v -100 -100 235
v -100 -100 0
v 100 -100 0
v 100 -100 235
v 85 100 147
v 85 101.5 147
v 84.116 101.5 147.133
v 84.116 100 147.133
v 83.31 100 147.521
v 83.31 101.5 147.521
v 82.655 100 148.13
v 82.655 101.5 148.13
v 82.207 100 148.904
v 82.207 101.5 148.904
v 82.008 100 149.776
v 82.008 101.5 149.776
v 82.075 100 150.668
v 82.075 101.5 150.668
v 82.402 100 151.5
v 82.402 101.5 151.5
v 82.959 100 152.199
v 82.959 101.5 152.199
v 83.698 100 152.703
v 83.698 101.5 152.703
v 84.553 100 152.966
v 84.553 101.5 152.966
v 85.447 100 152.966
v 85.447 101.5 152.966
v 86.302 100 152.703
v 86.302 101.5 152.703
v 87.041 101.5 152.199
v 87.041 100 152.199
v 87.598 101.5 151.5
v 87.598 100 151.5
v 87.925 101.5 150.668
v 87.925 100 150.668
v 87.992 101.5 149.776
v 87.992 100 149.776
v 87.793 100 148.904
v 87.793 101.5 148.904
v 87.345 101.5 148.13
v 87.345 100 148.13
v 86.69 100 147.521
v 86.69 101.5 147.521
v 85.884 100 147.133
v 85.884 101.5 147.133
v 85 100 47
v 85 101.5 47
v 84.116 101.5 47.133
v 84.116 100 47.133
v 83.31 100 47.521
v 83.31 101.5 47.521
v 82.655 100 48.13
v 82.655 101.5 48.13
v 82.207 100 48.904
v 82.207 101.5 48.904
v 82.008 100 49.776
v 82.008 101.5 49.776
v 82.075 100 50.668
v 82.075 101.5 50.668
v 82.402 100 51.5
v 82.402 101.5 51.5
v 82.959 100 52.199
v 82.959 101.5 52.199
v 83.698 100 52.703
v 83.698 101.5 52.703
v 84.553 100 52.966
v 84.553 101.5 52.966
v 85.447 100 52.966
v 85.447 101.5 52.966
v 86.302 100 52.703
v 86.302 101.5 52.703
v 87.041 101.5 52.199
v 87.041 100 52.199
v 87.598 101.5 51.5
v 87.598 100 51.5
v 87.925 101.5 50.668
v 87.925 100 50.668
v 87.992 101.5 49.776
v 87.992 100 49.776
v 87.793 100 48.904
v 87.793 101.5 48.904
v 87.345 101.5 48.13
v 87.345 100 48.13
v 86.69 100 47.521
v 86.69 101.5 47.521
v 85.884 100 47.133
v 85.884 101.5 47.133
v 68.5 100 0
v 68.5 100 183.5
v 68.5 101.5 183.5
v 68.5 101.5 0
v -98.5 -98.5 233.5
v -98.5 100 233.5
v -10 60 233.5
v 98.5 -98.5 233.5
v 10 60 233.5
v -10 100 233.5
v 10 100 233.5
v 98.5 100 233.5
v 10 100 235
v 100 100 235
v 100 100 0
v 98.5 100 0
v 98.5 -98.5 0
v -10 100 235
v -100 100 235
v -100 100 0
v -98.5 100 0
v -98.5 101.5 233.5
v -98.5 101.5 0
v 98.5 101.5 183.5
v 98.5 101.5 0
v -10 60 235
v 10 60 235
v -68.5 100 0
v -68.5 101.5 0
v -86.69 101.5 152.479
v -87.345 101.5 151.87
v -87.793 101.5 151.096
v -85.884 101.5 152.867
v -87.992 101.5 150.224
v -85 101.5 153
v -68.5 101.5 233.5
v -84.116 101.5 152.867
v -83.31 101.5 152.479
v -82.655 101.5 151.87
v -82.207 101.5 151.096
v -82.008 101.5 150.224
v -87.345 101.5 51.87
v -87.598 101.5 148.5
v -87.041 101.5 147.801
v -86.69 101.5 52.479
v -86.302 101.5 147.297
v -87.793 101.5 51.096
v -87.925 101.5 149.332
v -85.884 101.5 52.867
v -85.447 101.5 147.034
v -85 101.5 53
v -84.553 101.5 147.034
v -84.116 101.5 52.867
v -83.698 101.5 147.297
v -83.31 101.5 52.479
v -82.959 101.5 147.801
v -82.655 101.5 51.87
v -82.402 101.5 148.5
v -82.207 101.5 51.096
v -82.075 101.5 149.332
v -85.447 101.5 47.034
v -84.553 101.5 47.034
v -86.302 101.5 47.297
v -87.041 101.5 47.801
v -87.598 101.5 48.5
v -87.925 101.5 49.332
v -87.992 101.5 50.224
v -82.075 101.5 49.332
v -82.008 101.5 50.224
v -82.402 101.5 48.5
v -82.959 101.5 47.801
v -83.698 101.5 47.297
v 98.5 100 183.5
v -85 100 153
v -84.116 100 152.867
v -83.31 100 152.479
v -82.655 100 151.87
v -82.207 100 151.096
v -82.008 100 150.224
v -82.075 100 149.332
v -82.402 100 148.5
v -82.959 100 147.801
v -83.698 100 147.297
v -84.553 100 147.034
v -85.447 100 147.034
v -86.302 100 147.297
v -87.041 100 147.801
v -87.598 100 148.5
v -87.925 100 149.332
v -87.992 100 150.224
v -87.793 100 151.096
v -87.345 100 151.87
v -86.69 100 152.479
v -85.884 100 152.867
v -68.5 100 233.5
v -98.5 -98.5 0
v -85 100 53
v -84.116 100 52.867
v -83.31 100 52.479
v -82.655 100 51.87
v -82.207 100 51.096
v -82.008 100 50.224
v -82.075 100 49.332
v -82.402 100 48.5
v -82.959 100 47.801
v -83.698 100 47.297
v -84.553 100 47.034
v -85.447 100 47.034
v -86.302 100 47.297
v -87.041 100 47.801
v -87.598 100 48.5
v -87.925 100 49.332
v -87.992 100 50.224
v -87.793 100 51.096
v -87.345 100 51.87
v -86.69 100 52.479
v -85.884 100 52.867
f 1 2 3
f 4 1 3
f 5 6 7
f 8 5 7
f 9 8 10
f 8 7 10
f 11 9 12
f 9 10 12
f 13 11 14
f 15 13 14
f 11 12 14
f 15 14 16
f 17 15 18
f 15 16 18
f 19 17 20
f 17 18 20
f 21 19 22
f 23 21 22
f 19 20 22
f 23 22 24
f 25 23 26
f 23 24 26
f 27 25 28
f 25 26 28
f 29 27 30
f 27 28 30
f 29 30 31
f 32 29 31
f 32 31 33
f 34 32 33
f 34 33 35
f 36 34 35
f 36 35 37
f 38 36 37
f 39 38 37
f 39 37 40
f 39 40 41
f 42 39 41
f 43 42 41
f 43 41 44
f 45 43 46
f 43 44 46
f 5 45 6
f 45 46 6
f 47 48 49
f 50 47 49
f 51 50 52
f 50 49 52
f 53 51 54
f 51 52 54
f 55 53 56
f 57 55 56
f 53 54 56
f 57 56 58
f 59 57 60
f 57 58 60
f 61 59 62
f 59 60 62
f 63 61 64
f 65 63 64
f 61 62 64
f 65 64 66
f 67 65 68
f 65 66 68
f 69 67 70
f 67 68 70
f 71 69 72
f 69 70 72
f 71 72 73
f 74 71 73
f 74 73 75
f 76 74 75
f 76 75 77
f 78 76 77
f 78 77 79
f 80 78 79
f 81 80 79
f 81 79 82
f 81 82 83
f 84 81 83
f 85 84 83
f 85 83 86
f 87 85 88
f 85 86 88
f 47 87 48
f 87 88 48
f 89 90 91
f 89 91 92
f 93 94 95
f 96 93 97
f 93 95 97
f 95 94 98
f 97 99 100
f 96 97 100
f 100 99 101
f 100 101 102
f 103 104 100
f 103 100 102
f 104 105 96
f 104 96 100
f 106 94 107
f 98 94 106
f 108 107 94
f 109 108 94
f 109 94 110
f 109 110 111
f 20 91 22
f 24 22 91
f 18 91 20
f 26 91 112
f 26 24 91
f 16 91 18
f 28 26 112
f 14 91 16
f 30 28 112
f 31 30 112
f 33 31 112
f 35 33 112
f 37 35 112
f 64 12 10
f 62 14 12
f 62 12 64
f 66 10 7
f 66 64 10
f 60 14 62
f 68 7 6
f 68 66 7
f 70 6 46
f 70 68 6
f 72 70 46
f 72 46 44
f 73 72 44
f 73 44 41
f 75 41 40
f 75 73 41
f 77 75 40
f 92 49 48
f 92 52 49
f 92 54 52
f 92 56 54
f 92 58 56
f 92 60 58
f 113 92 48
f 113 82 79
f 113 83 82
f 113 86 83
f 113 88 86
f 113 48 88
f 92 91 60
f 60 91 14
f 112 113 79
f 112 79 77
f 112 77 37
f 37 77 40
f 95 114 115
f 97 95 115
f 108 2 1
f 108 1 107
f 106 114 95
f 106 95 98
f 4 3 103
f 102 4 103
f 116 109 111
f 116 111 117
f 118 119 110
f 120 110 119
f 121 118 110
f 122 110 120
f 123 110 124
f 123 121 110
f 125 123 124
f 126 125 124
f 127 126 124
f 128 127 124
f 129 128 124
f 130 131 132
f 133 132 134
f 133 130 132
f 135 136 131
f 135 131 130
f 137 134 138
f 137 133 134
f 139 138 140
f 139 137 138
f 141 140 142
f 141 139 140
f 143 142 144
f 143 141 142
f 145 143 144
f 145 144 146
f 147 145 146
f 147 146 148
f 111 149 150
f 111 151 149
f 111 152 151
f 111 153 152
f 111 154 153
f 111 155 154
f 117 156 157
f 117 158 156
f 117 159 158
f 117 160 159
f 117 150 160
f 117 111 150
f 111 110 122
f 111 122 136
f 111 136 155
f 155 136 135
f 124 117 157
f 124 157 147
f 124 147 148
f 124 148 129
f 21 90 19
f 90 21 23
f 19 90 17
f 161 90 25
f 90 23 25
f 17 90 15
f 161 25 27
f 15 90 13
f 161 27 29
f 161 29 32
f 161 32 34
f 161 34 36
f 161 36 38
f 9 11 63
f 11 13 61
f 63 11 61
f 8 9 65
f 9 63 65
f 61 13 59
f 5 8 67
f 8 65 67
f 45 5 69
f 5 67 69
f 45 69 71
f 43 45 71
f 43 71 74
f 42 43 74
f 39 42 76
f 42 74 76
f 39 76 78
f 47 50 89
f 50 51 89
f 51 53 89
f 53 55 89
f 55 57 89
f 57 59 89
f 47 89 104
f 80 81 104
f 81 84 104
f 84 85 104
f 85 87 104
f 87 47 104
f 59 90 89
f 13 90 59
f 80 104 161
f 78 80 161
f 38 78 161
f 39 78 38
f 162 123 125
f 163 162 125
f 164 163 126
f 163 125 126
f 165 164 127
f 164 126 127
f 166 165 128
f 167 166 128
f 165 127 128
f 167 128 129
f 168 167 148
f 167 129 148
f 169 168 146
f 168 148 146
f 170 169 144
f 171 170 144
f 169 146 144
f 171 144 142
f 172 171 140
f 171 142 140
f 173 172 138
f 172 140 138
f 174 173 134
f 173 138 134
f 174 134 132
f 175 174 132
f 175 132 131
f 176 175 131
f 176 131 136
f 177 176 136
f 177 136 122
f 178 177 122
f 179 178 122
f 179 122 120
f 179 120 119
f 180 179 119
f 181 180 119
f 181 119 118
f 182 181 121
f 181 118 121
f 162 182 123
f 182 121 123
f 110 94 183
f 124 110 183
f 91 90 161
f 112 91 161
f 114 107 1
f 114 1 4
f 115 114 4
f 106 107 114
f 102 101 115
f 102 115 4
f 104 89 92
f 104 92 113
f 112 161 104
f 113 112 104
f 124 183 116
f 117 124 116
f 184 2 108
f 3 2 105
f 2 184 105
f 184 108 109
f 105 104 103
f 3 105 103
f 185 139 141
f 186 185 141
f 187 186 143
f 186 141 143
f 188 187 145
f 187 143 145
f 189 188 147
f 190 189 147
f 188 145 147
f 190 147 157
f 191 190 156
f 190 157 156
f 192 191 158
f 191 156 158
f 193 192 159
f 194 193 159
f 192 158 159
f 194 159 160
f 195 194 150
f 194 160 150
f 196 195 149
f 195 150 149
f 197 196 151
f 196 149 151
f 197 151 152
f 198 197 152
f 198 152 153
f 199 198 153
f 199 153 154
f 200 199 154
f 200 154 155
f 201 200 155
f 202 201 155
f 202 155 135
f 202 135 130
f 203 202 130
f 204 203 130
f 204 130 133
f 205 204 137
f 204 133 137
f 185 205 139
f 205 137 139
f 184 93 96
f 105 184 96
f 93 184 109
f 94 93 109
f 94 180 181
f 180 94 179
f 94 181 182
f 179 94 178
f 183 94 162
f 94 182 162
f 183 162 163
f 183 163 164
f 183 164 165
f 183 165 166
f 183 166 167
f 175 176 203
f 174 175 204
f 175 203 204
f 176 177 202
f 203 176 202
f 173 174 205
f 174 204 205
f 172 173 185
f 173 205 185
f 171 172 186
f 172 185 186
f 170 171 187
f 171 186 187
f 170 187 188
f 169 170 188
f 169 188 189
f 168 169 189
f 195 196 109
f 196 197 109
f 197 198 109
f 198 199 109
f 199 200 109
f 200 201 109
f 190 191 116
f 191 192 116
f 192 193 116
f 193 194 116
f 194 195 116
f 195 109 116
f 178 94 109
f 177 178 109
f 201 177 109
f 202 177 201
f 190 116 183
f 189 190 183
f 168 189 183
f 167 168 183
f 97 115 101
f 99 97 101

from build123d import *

# Parameters (mm, degrees)
SKETCH1_W             = 200
SKETCH1_H             = 200
BOSS_EXTRUDE1_DEPTH   = 235
SHELL1_T              = -1.5
CUT_EXTRUDE1_REACH    = 276.272
SKETCH2_W             = 20
SKETCH2_H             = 40
SKETCH3_W             = 30
SKETCH3_H             = 233.5
BOSS_EXTRUDE2_DEPTH   = 1.5
SKETCH3_H_2           = 183.5
BOSS_EXTRUDE2_2_DEPTH = 1.5
SKETCH5_R             = 3
CUT_EXTRUDE3_DEPTH    = 1.5


with BuildPart() as part:
    # Sketch1 → Boss-Extrude1 (new body)
    with BuildSketch(Plane.XY):
        Rectangle(SKETCH1_W, SKETCH1_H)
    extrude(amount=BOSS_EXTRUDE1_DEPTH)

    # Shell1
    shell1_openings = [part.faces().sort_by_distance(p)[0] for p in [
        (0, 0, 0),
        (0, 100, 117.5),
    ]]
    offset(amount=SHELL1_T, openings=shell1_openings, kind=Kind.INTERSECTION)

    # Sketch2 → Cut-Extrude1 (cut, up to next)
    with BuildSketch(Plane.XY.offset(235), mode=Mode.PRIVATE) as cut_extrude1_sk1:
        with Locations((0, 80)):
            Rectangle(SKETCH2_W, SKETCH2_H)
    cut_extrude1_tool1 = extrude(cut_extrude1_sk1.sketch, amount=-CUT_EXTRUDE1_REACH, mode=Mode.PRIVATE) & part.part
    add(cut_extrude1_tool1.solids().sort_by_distance((0, 80, 235))[0], mode=Mode.SUBTRACT)


with BuildPart() as body_2:
    # Sketch3 → Boss-Extrude2 (new body)
    with BuildSketch(Plane(origin=(0, 100, 0), x_dir=(1, 0, 0), z_dir=(0, 1, 0))):
        with Locations((-83.5, -116.75)):
            Rectangle(SKETCH3_W, SKETCH3_H)
    extrude(amount=BOSS_EXTRUDE2_DEPTH)


with BuildPart() as body_3:
    # Sketch3 → Boss-Extrude2 2 (new body)
    with BuildSketch(Plane(origin=(0, 100, 0), x_dir=(1, 0, 0), z_dir=(0, 1, 0))):
        with Locations((83.5, -91.75)):
            Rectangle(SKETCH3_W, SKETCH3_H_2)
    extrude(amount=BOSS_EXTRUDE2_2_DEPTH)


with BuildPart() as cut_extrude3_tool:
    # Sketch5 → Cut-Extrude3 (new body)
    with BuildSketch(Plane(origin=(0, 101.5, 0), x_dir=(1, 0, 0), z_dir=(0, 1, 0))):
        with Locations(Location((-85, -50, 0), (0, 0, 270))):
            Circle(SKETCH5_R)
        with Locations(Location((-85, -150, 0), (0, 0, 270))):
            Circle(SKETCH5_R)
        with Locations(Location((85, -150, 0), (0, 0, 90))):
            Circle(SKETCH5_R)
        with Locations(Location((85, -50, 0), (0, 0, 90))):
            Circle(SKETCH5_R)
    extrude(amount=-CUT_EXTRUDE3_DEPTH)


with BuildPart() as body_2_1:
    add(body_2.part)

    # Cut-Extrude3: cut by cut_extrude3_tool
    add(cut_extrude3_tool.part, mode=Mode.SUBTRACT)


with BuildPart() as body_3_1:
    add(body_3.part)

    # Cut-Extrude3: cut by cut_extrude3_tool
    add(cut_extrude3_tool.part, mode=Mode.SUBTRACT)


solid = Compound([part.part, body_2_1.part, body_3_1.part])
